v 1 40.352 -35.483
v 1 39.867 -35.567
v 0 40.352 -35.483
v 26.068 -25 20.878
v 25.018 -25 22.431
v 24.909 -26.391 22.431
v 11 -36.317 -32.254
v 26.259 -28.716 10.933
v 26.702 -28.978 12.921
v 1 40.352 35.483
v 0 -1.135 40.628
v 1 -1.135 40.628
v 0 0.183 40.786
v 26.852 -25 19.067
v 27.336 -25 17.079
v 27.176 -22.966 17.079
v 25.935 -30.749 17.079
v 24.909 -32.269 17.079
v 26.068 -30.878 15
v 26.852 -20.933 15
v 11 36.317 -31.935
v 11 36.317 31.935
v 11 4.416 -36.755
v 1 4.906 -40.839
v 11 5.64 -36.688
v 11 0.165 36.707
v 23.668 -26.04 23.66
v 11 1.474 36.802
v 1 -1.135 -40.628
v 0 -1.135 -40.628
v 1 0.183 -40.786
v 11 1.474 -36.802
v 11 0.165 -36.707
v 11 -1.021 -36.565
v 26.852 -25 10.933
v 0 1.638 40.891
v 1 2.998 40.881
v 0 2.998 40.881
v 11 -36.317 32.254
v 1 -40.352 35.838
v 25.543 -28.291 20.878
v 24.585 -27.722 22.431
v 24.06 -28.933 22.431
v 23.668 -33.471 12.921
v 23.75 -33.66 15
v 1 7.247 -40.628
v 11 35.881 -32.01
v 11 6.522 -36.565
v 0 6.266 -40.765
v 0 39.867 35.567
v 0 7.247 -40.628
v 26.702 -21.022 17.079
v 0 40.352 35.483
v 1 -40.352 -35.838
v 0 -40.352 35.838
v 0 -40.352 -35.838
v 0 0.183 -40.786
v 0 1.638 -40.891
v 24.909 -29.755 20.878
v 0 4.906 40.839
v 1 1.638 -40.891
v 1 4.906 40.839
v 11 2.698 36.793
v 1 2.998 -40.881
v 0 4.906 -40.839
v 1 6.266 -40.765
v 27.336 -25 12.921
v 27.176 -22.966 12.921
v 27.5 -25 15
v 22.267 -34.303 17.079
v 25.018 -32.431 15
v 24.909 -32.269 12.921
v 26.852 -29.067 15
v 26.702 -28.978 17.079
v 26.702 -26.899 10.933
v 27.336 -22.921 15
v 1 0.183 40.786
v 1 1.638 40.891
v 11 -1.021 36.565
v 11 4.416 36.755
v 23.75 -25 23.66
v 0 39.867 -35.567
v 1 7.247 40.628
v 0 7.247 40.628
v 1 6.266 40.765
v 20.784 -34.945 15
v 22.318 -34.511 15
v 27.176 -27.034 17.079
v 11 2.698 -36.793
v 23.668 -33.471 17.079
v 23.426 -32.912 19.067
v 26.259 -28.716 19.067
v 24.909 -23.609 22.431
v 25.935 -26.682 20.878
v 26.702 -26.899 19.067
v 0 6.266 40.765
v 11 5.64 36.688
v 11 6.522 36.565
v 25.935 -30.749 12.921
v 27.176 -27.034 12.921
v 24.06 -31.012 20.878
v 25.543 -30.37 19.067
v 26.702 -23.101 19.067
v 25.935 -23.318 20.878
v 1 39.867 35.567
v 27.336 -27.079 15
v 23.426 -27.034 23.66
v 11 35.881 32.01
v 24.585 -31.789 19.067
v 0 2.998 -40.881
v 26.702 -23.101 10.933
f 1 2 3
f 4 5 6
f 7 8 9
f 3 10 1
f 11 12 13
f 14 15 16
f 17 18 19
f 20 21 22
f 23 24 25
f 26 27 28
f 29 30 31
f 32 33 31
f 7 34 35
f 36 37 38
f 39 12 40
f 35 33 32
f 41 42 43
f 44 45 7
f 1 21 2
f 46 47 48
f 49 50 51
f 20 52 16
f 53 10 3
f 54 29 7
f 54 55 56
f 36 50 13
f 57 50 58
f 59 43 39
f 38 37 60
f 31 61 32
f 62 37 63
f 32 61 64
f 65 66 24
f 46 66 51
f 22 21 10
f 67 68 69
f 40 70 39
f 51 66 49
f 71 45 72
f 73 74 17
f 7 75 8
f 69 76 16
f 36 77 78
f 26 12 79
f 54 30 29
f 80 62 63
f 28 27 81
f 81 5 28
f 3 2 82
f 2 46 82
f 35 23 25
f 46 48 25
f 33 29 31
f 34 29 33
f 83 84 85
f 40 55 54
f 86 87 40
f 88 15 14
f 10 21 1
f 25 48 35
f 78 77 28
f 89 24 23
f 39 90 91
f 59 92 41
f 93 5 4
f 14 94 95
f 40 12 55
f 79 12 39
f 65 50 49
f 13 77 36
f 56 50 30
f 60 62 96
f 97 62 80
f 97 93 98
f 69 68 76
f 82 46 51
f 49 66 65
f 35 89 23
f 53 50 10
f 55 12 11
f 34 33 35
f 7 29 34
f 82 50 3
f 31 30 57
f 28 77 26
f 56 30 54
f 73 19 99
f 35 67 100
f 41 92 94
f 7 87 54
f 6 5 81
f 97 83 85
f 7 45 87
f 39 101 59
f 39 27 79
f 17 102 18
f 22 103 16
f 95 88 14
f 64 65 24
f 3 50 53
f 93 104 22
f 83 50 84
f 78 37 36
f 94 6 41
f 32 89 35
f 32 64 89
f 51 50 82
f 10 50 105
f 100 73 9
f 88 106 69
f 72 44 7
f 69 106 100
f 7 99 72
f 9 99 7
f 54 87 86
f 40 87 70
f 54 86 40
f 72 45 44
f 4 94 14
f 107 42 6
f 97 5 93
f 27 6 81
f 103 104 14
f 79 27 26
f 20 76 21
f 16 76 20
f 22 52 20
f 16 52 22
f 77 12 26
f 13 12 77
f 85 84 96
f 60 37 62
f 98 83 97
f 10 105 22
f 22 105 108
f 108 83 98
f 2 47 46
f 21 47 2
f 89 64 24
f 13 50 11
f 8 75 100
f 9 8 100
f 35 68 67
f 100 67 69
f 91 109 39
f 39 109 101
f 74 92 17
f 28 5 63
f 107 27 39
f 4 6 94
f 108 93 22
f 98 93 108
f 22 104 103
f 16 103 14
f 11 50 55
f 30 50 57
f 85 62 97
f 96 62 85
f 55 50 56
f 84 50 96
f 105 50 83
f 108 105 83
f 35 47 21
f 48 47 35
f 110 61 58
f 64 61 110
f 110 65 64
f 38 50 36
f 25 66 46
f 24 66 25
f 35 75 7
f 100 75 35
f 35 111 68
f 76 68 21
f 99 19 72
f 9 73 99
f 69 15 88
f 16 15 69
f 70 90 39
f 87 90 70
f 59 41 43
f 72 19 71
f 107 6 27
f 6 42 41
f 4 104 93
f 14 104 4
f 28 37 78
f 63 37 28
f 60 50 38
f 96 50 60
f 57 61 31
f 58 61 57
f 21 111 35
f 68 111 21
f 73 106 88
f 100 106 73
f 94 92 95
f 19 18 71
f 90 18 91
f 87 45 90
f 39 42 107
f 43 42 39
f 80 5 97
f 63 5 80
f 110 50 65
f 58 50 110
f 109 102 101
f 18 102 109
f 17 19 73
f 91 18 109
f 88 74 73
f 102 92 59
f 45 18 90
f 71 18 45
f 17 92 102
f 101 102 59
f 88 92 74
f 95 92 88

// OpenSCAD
// file: palm_profile.scad
// Module names are of the form poly_<inkscape-path-id>().  As a result,
// you can associate a polygon in this OpenSCAD program with the corresponding
// SVG element in the Inkscape document by looking for the XML element with
// the attribute id="inkscape-path-id".

// fudge value is used to ensure that subtracted solids are a tad taller
// in the z dimension than the polygon being subtracted from.  This helps
// keep the resulting .stl file manifold.
fudge = 0.1;

module palm_profile(h)
{
  rotate([0,90,0])
  scale([25.4/90, -25.4/90, 1]) union()
  {
    linear_extrude(height=h)
      polygon([[-126.003755,-142.822125],[125.871825,-142.822125]]);
    linear_extrude(height=h)
      polygon([[125.726715,-142.980545],[126.025575,-141.262105],[126.137645,-135.509065],[126.436505,-127.327785],[126.585925,-121.425315],[126.996865,-115.485485],[127.856085,-105.660485],[128.304375,-101.775305],[128.790015,-98.413145],[129.163595,-96.769415],[129.462455,-95.760765],[129.910745,-94.154395],[130.620535,-90.045085],[131.479755,-83.656955],[133.123485,-71.926725],[134.057405,-65.912185],[135.626415,-56.871685],[136.037345,-54.854385],[136.523005,-52.762365],[137.830505,-47.943265],[139.997235,-39.687265],[141.902465,-32.066355],[143.957125,-25.678235],[144.442765,-22.203995],[144.704265,-17.384895],[144.853715,-10.623195],[144.891015,-5.804085],[144.517445,-0.648765],[143.957075,4.020915],[143.546145,6.523855],[143.097855,8.615875],[142.201285,12.463695],[140.968485,17.208085],[139.324755,22.736985],[137.830465,27.705525],[135.999955,33.383845],[134.804505,37.418445],[132.861925,43.918645],[131.890635,48.102675],[131.068765,52.809705],[129.350325,66.557245],[128.827325,71.338995],[128.146955,77.892295],[127.724295,84.443385],[127.407305,88.881215],[126.984655,142.980545],[-126.984655,142.980545],[-127.407295,88.881215],[-127.724295,84.443385],[-128.146945,77.892295],[-128.827315,71.338995],[-129.350315,66.557245],[-131.068765,52.809705],[-131.890625,48.102675],[-132.861915,43.918645],[-134.804505,37.418445],[-135.999945,33.383845],[-137.830455,27.705525],[-139.324755,22.736985],[-140.968485,17.208085],[-142.201275,12.463695],[-143.097855,8.615875],[-143.546145,6.523855],[-143.957075,4.020915],[-144.517435,-0.648765],[-144.891015,-5.804085],[-144.853715,-10.623195],[-144.704285,-17.384895],[-144.442785,-22.203995],[-143.957135,-25.678235],[-141.902475,-32.066355],[-139.997245,-39.687265],[-137.830515,-47.943265],[-136.523005,-52.762365],[-136.037365,-54.854385],[-135.626435,-56.871685],[-134.057415,-65.912185],[-133.123485,-71.926725],[-131.479755,-83.656955],[-130.620535,-90.045085],[-129.910745,-94.154395],[-129.462455,-95.760765],[-129.163595,-96.769415],[-128.790025,-98.413145],[-128.304375,-101.775305],[-127.856085,-105.660485],[-126.996865,-115.485485],[-126.585935,-121.425315],[-126.436505,-127.327785],[-126.137645,-135.509065],[-126.025575,-141.262105],[-125.726715,-142.980545]]);
  }
}

palm_profile(1);
// main file
use <palm_profile.scad>;

hull(){
palm_profile(1);

translate([10,0,0])
scale([1,.9,.9])
palm_profile(1);

translate([20,-25,15])
scale([.75,1,1])
sphere(10,true);
}
